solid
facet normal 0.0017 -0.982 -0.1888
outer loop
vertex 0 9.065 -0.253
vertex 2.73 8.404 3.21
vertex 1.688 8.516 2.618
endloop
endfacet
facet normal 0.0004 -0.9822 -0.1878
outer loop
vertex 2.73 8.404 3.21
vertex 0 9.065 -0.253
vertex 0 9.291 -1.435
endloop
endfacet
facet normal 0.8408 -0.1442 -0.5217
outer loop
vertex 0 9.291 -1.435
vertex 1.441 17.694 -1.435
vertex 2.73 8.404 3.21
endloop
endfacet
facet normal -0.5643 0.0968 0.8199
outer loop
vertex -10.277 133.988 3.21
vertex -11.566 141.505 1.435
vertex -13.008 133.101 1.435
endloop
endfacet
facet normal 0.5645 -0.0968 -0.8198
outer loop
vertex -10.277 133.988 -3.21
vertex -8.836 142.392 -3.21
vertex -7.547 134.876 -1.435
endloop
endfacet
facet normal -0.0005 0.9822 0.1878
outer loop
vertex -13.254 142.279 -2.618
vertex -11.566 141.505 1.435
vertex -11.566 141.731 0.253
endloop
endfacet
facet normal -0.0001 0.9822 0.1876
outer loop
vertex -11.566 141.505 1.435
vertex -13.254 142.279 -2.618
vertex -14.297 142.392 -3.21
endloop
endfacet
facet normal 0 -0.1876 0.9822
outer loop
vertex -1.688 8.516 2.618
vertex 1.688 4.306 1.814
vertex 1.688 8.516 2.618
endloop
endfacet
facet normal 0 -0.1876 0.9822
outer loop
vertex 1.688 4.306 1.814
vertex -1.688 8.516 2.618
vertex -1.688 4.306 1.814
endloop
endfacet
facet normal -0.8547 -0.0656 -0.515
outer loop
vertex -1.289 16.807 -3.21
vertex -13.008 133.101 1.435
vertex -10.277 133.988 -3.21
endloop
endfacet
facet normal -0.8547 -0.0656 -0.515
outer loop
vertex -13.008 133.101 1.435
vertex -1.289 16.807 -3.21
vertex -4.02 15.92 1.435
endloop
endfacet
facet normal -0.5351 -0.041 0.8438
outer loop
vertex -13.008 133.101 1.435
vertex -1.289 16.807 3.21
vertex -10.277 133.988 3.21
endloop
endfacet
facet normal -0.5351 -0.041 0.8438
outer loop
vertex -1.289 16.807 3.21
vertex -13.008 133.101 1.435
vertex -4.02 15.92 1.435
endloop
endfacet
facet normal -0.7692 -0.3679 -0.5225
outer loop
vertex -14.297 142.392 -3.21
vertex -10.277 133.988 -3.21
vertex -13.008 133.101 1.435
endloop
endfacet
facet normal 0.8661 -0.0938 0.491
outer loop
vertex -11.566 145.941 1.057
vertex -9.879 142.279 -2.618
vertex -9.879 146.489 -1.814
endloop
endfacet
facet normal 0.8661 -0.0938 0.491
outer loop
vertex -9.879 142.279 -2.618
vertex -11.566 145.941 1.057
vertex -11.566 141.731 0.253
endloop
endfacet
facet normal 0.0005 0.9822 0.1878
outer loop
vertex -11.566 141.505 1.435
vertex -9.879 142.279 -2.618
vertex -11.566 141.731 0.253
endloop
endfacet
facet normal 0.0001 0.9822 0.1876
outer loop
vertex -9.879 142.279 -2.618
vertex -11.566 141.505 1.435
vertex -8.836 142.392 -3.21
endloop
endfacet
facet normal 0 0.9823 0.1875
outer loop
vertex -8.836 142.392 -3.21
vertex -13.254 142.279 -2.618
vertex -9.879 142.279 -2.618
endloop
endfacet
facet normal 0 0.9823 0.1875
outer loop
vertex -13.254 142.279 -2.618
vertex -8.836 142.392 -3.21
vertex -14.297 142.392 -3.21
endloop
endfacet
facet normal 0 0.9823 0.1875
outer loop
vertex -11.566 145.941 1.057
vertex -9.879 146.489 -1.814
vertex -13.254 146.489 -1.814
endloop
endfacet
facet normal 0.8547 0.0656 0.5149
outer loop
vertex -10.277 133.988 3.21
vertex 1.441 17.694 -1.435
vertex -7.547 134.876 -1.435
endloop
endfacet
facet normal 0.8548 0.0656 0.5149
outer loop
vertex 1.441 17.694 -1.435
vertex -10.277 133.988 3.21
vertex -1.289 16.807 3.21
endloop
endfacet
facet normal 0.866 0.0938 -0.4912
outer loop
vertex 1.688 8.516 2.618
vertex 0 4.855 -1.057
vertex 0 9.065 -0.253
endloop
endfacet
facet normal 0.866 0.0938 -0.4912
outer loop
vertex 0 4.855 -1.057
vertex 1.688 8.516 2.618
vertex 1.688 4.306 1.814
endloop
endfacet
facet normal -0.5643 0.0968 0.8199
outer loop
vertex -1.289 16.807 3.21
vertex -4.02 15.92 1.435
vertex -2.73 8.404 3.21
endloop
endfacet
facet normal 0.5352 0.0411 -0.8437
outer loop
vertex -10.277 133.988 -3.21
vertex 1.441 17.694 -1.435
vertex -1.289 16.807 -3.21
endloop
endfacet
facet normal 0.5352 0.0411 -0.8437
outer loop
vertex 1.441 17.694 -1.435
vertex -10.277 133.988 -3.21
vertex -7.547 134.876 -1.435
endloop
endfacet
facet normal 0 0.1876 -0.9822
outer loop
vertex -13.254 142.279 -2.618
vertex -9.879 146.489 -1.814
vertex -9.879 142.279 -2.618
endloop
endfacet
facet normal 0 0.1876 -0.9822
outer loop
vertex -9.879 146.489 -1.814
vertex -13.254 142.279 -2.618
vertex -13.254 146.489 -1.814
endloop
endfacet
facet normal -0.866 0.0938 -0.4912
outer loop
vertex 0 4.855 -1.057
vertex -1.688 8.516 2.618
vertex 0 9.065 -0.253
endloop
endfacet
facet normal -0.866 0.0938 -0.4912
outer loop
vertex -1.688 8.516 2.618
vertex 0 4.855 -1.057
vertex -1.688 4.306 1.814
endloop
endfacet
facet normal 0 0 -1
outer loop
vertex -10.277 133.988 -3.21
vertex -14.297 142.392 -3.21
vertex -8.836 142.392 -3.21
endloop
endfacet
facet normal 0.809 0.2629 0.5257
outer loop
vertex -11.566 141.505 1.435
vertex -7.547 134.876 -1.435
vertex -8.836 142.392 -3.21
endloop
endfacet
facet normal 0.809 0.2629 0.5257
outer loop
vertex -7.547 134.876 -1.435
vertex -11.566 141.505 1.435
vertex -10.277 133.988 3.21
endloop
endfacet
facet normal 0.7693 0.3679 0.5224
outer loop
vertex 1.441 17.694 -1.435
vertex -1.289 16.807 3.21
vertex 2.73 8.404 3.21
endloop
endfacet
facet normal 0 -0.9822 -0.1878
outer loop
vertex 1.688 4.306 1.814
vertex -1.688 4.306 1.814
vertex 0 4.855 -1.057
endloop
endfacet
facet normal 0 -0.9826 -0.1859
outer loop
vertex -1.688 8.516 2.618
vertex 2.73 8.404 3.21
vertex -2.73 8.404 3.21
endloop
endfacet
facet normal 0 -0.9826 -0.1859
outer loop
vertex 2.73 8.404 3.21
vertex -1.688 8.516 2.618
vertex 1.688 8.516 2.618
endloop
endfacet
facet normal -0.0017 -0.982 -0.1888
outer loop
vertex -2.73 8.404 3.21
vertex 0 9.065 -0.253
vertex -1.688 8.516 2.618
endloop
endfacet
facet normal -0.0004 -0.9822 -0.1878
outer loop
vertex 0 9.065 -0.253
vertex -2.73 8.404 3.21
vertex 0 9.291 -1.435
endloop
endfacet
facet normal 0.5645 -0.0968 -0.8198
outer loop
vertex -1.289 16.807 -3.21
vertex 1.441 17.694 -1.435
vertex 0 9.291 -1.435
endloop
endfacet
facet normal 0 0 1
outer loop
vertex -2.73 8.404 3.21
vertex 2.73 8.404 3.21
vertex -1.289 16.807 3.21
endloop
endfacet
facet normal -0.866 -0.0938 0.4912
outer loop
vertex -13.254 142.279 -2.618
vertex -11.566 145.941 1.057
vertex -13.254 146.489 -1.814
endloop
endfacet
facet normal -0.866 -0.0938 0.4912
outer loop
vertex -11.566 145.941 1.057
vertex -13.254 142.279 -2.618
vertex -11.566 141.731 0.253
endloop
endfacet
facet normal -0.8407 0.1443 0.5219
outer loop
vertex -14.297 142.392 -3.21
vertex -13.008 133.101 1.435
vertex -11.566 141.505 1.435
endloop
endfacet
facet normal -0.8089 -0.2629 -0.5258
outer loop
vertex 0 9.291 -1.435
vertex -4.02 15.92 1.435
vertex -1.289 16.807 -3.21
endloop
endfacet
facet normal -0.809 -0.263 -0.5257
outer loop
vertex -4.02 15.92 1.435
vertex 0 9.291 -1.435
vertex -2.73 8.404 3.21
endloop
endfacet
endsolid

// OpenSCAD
sc=(4+2*sqrt(5))/cos(16.5);
points=[[ 0, 0, 0 ],[ 0.404508497187474, 0, -0.390576474687264 ],[ 0.522542485937369, -0.190983005625053, -0.0815594803123161 ],[ 0.522542485937369, 0.190983005625053, -0.0815594803123161 ],[ 0.809016994374947, 0, -0.690983005625053 ],[ 0.857649672291719, 0, -0.563661001875018 ],[ 0.975683661041614, -0.190983005625053, -0.25464400750007 ],[ 0.975683661041614, 0.190983005625053, -0.25464400750007 ],[ 1, -0.309016994374947, -0.190983005625053 ],[ 1, 0.309016994374947, -0.190983005625053 ],[ 1.42705098312484, 0.145898033750315, -1.30901699437495 ],[ 1.61803398874989, -0.163118960624632, -1.19098300562505 ],[ 1.61803398874989, 0.454915028125263, -0.809016994374947 ],[ 1.80901699437495, 0.145898033750315, -0.690983005625053 ],[ 11.0901699437495, -4.23606797749979, -6.85410196624968 ],[ 12.7082039324994, 1.16311896062463, -8.28115294937453 ],[ 12.8991869381244, 0.854101966249685, -8.16311896062463 ],[ 12.8991869381244, 1.47213595499958, -7.78115294937453 ],[ 13.0901699437495, 1.16311896062463, -7.66311896062463 ],[ 13.5172209268743, 1, -8.78115294937453 ],[ 13.5172209268743, 1.61803398874989, -8.78115294937453 ],[ 13.5415372658327, 1.11803398874989, -8.71749194749951 ],[ 13.5415372658327, 1.5, -8.71749194749951 ],[ 13.6595712545826, 1.30901699437495, -8.40847495312456 ],[ 13.7082039324994, 1.30901699437495, -8.28115294937453 ],[ 13.9946784409369, 1.11803398874989, -8.89057647468726 ],[ 13.9946784409369, 1.5, -8.89057647468726 ],[ 14.1127124296868, 1.30901699437495, -8.58155948031232 ],[ 14.5172209268743, 1.30901699437495, -8.97213595499958 ]];

scale(sc) rotate([31.717474,0,0]) rotate([0,0,90.000000])  polyhedron(points,faces=[[ 8, 4, 5, 6 ],[ 8, 11, 4 ],[ 17, 24, 18 ],[ 16, 19, 15 ],[ 23, 24, 20, 22 ],[ 2, 3, 7, 6 ],[ 10, 15, 17, 12 ],[ 12, 17, 18, 13 ],[ 17, 15, 20 ],[ 23, 27, 25, 21 ],[ 21, 19, 24, 23 ],[ 20, 19, 21, 22 ],[ 26, 25, 27 ],[ 13, 18, 16, 11 ],[ 1, 2, 6, 5 ],[ 9, 12, 13 ],[ 11, 16, 15, 10 ],[ 21, 25, 26, 22 ],[ 7, 3, 1, 5 ],[ 19, 20, 15 ],[ 18, 24, 19, 16 ],[ 8, 13, 11 ],[ 1, 3, 2 ],[ 7, 9, 8, 6 ],[ 9, 7, 5, 4 ],[ 4, 11, 10 ],[ 13, 8, 9 ],[ 26, 27, 23, 22 ],[ 24, 17, 20 ],[ 12, 9, 4, 10 ]]);

    
